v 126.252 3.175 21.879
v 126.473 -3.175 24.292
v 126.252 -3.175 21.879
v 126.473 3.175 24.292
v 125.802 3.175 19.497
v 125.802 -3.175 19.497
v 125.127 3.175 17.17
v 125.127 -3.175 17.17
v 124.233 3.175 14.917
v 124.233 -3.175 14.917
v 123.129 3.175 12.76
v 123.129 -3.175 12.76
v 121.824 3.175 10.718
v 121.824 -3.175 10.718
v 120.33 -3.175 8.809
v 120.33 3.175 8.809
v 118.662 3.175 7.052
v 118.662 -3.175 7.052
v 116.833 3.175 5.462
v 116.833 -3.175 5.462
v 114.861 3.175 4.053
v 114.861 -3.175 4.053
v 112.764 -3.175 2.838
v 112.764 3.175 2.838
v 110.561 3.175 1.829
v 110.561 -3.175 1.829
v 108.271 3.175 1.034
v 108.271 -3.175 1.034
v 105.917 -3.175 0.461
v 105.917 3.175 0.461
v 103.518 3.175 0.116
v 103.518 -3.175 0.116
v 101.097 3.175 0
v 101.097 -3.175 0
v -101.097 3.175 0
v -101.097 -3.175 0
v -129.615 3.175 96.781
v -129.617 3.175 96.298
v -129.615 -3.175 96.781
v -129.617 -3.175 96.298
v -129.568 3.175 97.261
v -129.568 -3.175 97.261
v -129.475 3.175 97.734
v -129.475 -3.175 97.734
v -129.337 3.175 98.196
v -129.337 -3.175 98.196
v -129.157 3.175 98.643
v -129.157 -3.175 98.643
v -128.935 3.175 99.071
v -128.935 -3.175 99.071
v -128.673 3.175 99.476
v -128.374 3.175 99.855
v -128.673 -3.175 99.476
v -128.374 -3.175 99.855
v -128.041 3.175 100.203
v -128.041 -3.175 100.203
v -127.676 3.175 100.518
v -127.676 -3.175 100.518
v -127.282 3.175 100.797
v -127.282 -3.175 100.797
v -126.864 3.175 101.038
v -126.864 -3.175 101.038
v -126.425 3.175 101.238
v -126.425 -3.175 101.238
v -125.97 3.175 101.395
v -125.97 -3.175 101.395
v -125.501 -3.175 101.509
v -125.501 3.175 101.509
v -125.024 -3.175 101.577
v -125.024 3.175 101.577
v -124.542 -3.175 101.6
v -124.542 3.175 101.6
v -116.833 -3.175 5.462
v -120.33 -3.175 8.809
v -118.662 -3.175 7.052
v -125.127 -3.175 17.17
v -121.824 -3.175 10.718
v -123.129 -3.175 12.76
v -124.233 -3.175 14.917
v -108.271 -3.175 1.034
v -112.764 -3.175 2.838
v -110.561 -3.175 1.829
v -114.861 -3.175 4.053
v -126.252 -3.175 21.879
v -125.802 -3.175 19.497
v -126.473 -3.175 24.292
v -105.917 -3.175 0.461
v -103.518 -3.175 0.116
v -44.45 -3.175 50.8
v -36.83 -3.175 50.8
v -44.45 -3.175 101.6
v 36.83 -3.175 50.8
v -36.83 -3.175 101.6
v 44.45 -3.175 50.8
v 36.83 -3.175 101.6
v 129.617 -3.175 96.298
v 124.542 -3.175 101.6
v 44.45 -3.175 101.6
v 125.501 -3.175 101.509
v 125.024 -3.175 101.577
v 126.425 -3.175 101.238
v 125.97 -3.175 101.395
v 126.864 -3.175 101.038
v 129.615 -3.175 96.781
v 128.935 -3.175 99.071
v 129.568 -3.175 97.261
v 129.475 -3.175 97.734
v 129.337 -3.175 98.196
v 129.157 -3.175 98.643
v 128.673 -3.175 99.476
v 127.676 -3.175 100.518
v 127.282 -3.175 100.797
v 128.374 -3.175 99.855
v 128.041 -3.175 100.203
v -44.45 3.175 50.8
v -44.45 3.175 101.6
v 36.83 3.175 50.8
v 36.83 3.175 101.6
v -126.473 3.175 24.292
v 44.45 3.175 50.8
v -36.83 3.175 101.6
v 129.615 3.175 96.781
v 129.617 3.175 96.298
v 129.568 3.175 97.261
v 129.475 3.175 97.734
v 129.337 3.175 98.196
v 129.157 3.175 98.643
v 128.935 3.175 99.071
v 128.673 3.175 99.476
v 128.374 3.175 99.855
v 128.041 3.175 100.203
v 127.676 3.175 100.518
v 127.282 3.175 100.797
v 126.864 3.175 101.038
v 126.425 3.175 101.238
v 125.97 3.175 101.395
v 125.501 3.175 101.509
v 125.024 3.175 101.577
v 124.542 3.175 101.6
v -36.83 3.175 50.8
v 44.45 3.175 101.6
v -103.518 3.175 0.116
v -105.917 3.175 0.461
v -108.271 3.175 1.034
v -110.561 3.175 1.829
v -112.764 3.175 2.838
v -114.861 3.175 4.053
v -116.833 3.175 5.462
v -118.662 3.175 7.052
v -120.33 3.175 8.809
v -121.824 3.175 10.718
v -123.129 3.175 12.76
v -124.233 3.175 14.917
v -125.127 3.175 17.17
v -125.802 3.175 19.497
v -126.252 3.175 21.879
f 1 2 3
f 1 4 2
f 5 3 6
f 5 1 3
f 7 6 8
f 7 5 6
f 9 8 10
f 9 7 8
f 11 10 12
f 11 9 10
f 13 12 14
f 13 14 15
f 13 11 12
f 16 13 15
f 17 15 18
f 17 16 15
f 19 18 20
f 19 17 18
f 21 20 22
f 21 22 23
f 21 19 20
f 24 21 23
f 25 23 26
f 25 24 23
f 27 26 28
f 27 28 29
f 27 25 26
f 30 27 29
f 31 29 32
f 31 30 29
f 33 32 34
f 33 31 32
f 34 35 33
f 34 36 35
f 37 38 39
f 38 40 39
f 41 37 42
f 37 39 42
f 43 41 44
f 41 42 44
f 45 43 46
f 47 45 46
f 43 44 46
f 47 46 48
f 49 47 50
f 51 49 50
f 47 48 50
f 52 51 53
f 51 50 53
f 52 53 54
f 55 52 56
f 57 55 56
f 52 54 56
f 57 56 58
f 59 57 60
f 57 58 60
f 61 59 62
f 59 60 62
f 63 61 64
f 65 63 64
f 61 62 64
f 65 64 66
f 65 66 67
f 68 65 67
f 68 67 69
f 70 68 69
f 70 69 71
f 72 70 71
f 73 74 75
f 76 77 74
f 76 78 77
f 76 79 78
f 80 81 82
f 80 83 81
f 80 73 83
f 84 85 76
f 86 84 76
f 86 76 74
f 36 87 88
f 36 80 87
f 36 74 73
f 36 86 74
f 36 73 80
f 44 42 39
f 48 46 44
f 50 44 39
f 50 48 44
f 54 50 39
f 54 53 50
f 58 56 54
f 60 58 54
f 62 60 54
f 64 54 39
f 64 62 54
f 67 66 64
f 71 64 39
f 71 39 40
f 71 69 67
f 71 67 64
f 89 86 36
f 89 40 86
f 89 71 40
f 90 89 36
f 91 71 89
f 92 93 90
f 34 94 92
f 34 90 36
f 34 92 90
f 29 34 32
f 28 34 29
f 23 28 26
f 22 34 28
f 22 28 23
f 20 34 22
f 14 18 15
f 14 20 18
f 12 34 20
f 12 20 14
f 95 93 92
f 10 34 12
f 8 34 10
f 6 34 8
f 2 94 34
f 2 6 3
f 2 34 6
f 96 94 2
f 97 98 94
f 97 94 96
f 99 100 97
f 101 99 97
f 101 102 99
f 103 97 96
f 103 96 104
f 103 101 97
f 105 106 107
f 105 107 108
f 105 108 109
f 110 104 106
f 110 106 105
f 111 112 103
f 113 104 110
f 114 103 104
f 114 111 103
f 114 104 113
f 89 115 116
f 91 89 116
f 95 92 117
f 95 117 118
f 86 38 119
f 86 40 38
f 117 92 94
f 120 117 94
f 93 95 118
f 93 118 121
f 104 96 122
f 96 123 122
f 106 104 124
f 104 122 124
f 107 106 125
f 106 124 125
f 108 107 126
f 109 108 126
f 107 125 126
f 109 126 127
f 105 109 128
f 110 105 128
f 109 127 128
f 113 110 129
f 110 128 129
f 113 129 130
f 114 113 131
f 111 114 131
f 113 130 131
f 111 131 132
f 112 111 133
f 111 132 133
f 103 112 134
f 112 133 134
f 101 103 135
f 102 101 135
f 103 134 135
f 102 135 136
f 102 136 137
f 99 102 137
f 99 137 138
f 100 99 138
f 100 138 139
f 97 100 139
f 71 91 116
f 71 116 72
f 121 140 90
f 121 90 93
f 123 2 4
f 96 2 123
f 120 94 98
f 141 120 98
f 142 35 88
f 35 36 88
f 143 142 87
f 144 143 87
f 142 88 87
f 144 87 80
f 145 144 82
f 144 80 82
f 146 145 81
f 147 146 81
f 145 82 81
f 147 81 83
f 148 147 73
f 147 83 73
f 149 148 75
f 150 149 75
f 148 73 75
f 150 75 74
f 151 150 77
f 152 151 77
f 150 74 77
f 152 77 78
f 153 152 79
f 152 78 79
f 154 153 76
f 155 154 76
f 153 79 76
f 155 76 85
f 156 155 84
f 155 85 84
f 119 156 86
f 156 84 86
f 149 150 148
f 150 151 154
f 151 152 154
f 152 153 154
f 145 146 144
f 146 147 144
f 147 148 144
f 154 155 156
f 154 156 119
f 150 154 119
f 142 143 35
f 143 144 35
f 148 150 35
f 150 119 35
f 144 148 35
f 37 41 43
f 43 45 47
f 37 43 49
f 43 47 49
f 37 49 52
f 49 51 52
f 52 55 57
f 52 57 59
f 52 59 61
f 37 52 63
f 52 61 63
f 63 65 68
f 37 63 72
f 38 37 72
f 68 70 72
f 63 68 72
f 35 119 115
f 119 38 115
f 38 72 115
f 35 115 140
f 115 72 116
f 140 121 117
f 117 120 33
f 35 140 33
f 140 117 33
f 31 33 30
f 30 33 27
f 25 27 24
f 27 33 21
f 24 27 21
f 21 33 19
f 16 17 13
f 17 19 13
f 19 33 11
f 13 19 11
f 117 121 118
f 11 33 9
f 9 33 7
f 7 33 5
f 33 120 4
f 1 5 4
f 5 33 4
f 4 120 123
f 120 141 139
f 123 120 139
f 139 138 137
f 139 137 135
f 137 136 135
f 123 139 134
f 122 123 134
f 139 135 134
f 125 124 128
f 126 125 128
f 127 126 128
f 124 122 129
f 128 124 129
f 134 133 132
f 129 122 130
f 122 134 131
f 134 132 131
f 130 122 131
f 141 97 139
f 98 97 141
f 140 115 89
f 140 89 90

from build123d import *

# Parameters (mm, degrees)
F1_DEPTH = 3.175
F2_W     = 7.62
F2_H     = 50.8
F3_DEPTH = 12.7
F4_R     = 25.4
F5_R     = 5.08


with BuildPart() as f1:
    # F0 (on Front) → F1 (new body, symmetric)
    with BuildSketch(Plane.XZ):
        Polygon((129.848452, 101.6), (-129.848452, 101.6), (-125.4125, 0), (125.4125, 0), align=None)
    extrude(amount=F1_DEPTH, both=True)

    # F2 (on Front) → F3 (cut, symmetric)
    with BuildSketch(Plane.XZ):
        with Locations((-40.64, 76.2)):
            Rectangle(F2_W, F2_H)
        with Locations((40.64, 76.2)):
            Rectangle(F2_W, F2_H)
    extrude(amount=F3_DEPTH, both=True, mode=Mode.SUBTRACT)

    # F4
    f4_edges = [f1.edges().sort_by_distance(p)[0] for p in [
        (-125.4125, 0, 0),
        (125.4125, 0, 0),
    ]]
    fillet(f4_edges, radius=F4_R)

    # F5
    f5_edges = [f1.edges().sort_by_distance(p)[0] for p in [
        (-129.848452, 0, 101.6),
        (129.848452, 0, 101.6),
    ]]
    fillet(f5_edges, radius=F5_R)


solid = f1.part
